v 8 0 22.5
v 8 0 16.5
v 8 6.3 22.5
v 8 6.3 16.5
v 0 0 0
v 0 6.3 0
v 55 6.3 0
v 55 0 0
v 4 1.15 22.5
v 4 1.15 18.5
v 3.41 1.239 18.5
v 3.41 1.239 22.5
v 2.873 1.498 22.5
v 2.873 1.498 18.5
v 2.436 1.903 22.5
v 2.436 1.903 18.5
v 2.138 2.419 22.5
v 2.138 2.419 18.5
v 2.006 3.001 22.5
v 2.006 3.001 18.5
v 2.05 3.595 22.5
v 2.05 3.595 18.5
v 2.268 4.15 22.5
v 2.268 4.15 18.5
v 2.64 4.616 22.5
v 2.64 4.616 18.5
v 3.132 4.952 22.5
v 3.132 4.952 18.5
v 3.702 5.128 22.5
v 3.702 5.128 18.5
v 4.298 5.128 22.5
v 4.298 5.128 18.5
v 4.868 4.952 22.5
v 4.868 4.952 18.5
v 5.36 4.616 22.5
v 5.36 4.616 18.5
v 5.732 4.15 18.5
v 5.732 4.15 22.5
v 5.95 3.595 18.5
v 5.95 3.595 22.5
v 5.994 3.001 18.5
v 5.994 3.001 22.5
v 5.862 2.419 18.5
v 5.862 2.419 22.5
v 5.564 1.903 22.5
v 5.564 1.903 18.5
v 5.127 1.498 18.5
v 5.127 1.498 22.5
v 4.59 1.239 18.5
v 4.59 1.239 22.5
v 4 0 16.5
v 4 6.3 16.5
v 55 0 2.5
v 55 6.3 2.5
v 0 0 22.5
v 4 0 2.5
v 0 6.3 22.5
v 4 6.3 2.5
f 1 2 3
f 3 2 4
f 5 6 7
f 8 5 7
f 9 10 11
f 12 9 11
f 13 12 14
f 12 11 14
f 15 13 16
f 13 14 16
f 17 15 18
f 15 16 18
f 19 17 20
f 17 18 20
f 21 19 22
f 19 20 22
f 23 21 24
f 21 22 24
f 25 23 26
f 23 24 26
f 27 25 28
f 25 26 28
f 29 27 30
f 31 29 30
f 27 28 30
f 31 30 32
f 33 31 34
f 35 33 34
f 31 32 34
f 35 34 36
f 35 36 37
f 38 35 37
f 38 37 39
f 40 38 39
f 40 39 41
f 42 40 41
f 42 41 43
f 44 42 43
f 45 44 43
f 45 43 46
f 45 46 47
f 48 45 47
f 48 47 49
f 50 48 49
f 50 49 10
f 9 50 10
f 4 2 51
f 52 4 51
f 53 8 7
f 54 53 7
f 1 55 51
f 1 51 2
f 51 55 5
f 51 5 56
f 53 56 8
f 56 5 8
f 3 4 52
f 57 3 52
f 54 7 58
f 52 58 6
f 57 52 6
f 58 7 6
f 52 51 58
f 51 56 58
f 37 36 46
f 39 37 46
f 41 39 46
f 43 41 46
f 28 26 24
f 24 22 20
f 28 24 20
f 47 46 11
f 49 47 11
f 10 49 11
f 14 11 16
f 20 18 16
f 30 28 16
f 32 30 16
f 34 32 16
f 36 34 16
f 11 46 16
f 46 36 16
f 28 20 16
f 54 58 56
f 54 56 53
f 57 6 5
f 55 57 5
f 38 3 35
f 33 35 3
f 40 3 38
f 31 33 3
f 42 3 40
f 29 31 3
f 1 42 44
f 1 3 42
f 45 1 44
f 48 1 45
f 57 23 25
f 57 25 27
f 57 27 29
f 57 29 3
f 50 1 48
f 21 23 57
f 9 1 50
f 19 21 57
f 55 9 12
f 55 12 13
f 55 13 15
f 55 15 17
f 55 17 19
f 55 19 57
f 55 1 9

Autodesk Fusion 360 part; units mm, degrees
sketch "Sketch1" plane through (0, 0, 0) normal (0, 0, 1) x (1, 0, 0)
  line L0 (0, 0) -> (55, 0)
  line L1 (55, 0) -> (55, 6.3)
  line L2 (55, 6.3) -> (0, 6.3)
  line L3 (0, 6.3) -> (0, 0)
  dimension "d1" = 55
  dimension "d2" = 6.3
extrude "Extrude1" add sketch "Sketch1" along normal blind 2.5 makes body 1
sketch "Sketch2" plane through (0, 0, 2.5) normal (0, 0, 1) x (-1, 0, 0)
  line L0 (0, -6.3) -> (0, 0)
  line L1 (0, 0) -> (-55, 0)
  line L2 (-55, 0) -> (-55, -6.3)
  line L3 (-55, -6.3) -> (0, -6.3)
  line L4 (0, 0) -> (-4, 0)
  line L5 (-4, 0) -> (-4, -6.3)
  line L6 (-4, -6.3) -> (0, -6.3)
  line L7 (0, -6.3) -> (0, 0)
  dimension "d5" = 4
extrude "Extrude2" add sketch "Sketch2" along normal blind 14 contours L0 L1 L3 L4 L5 L6 L7 bodies 1
sketch "Sketch3" plane through (0, 0, 16.5) normal (0, 0, 1) x (-1, 0, 0)
  line L0 (0, -6.3) -> (0, 0)
  line L1 (0, 0) -> (-4, 0)
  line L2 (-4, 0) -> (-4, -6.3)
  line L3 (-4, -6.3) -> (0, -6.3)
  line L4 (0, 0) -> (-8, 0)
  line L5 (-8, 0) -> (-8, -6.3)
  line L6 (-8, -6.3) -> (0, -6.3)
  line L7 (0, -6.3) -> (0, 0)
  dimension "d8" = 8
  dimension "d9" = 6.3
extrude "Extrude3" add sketch "Sketch3" along normal blind 6 bodies 1
hole "Hole1" at (4, 3.15, 22.5) direction (0, 0, -1) diameter 4 depth 4 tip angle 180 bodies 1
copy_body "Body->Comp1" bodies 1 removing the originals makes body 2 in component "Hook v2 (1)"
component "Hook v2 (1)" placed x (1, 0, 0) y (0, 1, 0) z (0, 0, 1) at (0, 0, 0)
